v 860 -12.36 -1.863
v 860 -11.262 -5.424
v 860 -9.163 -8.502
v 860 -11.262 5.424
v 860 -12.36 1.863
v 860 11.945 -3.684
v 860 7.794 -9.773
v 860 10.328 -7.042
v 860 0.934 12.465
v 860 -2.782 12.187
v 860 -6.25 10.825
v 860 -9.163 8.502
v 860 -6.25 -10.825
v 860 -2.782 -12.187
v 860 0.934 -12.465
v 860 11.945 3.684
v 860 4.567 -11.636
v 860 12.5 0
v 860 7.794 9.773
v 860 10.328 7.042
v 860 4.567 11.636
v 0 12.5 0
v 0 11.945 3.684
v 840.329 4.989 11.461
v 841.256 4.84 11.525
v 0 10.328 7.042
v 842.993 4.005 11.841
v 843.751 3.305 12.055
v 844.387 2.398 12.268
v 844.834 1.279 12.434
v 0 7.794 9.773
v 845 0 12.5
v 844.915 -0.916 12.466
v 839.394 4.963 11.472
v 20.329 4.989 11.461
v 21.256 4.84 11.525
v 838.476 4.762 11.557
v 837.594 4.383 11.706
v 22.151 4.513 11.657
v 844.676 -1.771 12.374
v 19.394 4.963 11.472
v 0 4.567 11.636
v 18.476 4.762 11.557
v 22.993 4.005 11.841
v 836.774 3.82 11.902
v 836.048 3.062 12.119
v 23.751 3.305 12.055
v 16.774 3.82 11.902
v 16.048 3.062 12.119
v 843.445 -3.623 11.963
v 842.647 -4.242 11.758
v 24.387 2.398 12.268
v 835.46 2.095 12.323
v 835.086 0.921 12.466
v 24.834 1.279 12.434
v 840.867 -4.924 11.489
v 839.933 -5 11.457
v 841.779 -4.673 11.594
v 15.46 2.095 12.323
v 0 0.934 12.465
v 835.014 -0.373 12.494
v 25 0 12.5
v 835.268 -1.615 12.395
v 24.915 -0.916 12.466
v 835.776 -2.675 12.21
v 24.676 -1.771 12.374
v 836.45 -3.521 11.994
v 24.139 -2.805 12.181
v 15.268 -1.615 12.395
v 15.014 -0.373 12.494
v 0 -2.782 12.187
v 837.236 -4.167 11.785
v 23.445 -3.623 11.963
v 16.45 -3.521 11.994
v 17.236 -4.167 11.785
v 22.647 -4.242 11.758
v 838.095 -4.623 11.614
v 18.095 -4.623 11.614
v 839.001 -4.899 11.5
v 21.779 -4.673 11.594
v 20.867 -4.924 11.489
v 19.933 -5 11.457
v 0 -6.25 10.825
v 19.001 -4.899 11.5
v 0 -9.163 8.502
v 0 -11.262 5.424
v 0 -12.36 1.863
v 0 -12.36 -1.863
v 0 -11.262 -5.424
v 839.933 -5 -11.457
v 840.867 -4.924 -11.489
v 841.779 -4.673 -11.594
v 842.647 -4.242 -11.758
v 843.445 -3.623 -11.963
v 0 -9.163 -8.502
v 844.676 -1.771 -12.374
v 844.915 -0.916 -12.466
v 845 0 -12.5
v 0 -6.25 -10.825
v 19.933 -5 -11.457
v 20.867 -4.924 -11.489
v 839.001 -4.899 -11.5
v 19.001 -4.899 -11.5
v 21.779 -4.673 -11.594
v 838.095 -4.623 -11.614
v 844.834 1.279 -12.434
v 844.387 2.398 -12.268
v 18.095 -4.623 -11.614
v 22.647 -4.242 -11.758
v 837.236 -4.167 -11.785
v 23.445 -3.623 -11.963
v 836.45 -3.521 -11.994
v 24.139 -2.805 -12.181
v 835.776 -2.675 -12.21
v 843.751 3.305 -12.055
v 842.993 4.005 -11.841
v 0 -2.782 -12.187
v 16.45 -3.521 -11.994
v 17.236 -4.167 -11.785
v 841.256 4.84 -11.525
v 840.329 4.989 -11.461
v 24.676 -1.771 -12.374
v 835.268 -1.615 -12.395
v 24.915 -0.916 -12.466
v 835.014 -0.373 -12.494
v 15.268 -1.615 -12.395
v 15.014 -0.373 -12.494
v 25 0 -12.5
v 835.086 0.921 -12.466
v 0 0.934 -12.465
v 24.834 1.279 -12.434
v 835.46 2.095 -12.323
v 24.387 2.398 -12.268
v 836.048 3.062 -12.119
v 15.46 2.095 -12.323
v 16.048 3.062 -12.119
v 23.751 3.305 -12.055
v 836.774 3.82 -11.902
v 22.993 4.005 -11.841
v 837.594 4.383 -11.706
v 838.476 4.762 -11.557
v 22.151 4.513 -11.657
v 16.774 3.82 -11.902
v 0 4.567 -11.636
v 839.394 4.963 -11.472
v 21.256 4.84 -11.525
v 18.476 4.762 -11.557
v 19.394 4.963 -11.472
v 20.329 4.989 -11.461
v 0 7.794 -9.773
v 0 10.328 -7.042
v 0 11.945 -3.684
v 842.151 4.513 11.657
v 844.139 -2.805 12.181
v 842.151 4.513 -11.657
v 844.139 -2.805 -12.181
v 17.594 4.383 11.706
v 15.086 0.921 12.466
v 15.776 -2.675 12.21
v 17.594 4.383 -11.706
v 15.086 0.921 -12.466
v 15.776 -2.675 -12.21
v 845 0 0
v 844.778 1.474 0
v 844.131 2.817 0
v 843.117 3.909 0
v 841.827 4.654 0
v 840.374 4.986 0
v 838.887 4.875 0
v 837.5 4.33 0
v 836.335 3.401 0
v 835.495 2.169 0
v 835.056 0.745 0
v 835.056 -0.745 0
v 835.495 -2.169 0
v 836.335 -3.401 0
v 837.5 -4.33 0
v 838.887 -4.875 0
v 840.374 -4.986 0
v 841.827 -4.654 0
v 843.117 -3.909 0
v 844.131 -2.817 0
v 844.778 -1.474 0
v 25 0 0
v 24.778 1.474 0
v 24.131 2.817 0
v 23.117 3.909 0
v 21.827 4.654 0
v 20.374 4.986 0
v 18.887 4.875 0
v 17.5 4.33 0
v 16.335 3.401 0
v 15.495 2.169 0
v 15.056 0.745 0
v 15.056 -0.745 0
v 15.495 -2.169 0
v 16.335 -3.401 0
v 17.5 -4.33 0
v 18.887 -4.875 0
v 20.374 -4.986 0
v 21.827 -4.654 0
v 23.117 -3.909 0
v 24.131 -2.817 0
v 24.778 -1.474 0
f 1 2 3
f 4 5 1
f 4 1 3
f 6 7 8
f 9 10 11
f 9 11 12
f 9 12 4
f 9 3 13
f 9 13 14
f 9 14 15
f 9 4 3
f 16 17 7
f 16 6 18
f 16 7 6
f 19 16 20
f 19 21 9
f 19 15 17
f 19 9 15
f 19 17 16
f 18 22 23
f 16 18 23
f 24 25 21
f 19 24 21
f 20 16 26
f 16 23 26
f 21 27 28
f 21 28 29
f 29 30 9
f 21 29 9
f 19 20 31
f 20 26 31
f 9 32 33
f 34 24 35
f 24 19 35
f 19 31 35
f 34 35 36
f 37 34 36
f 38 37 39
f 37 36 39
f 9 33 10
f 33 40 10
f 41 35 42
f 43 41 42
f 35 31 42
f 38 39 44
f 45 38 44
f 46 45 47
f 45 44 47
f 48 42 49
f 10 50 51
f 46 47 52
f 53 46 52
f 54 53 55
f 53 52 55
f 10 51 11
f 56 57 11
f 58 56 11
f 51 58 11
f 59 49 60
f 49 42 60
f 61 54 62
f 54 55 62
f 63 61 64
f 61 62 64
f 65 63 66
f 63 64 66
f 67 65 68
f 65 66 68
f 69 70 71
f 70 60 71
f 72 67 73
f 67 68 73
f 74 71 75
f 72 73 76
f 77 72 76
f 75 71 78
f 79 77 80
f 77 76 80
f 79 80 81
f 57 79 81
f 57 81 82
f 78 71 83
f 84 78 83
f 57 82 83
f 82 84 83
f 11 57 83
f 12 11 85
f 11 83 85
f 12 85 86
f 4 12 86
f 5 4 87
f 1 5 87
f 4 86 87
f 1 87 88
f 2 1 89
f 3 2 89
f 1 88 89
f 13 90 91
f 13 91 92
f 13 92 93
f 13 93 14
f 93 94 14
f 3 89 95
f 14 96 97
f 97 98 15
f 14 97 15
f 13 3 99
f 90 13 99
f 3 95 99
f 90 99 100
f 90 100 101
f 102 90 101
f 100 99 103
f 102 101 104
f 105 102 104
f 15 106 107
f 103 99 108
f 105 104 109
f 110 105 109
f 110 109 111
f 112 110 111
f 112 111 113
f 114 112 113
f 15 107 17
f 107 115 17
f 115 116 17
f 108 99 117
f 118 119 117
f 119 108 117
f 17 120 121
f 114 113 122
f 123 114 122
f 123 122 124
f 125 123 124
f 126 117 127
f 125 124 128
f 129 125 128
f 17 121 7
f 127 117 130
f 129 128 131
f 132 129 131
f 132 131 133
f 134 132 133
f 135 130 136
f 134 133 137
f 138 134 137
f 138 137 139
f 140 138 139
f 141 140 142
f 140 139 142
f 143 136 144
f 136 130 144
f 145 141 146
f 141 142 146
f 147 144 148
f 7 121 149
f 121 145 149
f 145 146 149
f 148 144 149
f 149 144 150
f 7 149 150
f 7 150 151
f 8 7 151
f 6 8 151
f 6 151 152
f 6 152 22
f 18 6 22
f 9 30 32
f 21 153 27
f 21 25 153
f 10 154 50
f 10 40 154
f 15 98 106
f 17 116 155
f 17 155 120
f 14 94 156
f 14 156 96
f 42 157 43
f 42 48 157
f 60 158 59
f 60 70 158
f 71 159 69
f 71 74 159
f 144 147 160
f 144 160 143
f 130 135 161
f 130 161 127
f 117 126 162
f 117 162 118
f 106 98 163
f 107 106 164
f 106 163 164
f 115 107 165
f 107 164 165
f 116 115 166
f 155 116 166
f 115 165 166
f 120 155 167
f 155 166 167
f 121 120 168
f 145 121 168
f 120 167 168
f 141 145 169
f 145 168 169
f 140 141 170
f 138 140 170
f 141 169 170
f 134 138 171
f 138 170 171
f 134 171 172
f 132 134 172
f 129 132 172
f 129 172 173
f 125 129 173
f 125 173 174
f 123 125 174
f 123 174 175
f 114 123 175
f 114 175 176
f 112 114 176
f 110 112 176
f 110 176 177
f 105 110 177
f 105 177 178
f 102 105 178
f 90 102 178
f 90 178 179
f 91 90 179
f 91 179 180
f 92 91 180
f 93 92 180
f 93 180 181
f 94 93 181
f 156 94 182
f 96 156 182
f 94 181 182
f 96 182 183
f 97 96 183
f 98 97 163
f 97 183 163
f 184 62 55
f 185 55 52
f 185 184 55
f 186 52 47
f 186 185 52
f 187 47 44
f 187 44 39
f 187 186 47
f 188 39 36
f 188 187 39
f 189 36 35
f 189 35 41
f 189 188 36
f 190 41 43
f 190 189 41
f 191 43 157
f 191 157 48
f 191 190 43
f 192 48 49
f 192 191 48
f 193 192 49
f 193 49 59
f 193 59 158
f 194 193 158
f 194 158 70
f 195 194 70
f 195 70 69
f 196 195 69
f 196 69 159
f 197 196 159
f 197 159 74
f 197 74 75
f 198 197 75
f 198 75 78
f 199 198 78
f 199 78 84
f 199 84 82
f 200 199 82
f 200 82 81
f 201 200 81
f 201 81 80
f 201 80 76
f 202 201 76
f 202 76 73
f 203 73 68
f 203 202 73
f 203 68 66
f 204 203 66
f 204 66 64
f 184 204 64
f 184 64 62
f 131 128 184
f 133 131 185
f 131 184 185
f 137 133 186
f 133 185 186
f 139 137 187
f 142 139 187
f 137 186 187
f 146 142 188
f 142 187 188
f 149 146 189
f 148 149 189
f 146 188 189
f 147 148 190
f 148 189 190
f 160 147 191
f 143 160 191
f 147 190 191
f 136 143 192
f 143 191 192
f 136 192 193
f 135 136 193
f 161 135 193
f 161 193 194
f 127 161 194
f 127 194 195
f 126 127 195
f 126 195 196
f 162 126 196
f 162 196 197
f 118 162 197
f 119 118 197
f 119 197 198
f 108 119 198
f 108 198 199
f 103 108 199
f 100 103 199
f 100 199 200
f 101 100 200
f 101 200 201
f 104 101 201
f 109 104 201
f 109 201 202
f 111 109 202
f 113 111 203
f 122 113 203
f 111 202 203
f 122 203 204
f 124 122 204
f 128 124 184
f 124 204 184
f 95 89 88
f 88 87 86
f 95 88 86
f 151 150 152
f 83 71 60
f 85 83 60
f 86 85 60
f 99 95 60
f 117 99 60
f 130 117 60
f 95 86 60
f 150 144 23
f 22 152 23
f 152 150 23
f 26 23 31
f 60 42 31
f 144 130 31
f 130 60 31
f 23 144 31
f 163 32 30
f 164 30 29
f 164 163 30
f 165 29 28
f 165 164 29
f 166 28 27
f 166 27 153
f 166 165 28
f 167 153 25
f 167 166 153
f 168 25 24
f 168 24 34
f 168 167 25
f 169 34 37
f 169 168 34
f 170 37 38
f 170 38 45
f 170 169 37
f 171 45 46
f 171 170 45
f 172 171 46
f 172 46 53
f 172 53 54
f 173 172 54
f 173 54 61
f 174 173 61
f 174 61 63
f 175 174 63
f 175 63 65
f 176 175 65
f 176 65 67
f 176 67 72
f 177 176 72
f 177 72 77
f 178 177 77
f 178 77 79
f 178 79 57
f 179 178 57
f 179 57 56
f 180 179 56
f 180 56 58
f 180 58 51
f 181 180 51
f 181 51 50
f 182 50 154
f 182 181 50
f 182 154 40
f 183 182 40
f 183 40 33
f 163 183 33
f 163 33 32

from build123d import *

# Parameters (mm, degrees)
F0_R          = 12.5
F1_DEPTH      = 860
F2_R          = 5
F3_DEPTH      = 12.501
F3_DEPTH_BACK = 12.501


with BuildPart() as f1:
    # F0 (on Right) → F1 (new body)
    with BuildSketch(Plane.YZ):
        Circle(F0_R)
    extrude(amount=F1_DEPTH)

    # F2 (on Top) → F3 (cut, two sides)
    with BuildSketch(Plane.XY) as f3_sk:
        with Locations((20, 0)):
            Circle(F2_R)
        with Locations((840, 0)):
            Circle(F2_R)
    extrude(amount=F3_DEPTH, mode=Mode.SUBTRACT)
    extrude(f3_sk.sketch, amount=-F3_DEPTH_BACK, mode=Mode.SUBTRACT)


solid = f1.part
